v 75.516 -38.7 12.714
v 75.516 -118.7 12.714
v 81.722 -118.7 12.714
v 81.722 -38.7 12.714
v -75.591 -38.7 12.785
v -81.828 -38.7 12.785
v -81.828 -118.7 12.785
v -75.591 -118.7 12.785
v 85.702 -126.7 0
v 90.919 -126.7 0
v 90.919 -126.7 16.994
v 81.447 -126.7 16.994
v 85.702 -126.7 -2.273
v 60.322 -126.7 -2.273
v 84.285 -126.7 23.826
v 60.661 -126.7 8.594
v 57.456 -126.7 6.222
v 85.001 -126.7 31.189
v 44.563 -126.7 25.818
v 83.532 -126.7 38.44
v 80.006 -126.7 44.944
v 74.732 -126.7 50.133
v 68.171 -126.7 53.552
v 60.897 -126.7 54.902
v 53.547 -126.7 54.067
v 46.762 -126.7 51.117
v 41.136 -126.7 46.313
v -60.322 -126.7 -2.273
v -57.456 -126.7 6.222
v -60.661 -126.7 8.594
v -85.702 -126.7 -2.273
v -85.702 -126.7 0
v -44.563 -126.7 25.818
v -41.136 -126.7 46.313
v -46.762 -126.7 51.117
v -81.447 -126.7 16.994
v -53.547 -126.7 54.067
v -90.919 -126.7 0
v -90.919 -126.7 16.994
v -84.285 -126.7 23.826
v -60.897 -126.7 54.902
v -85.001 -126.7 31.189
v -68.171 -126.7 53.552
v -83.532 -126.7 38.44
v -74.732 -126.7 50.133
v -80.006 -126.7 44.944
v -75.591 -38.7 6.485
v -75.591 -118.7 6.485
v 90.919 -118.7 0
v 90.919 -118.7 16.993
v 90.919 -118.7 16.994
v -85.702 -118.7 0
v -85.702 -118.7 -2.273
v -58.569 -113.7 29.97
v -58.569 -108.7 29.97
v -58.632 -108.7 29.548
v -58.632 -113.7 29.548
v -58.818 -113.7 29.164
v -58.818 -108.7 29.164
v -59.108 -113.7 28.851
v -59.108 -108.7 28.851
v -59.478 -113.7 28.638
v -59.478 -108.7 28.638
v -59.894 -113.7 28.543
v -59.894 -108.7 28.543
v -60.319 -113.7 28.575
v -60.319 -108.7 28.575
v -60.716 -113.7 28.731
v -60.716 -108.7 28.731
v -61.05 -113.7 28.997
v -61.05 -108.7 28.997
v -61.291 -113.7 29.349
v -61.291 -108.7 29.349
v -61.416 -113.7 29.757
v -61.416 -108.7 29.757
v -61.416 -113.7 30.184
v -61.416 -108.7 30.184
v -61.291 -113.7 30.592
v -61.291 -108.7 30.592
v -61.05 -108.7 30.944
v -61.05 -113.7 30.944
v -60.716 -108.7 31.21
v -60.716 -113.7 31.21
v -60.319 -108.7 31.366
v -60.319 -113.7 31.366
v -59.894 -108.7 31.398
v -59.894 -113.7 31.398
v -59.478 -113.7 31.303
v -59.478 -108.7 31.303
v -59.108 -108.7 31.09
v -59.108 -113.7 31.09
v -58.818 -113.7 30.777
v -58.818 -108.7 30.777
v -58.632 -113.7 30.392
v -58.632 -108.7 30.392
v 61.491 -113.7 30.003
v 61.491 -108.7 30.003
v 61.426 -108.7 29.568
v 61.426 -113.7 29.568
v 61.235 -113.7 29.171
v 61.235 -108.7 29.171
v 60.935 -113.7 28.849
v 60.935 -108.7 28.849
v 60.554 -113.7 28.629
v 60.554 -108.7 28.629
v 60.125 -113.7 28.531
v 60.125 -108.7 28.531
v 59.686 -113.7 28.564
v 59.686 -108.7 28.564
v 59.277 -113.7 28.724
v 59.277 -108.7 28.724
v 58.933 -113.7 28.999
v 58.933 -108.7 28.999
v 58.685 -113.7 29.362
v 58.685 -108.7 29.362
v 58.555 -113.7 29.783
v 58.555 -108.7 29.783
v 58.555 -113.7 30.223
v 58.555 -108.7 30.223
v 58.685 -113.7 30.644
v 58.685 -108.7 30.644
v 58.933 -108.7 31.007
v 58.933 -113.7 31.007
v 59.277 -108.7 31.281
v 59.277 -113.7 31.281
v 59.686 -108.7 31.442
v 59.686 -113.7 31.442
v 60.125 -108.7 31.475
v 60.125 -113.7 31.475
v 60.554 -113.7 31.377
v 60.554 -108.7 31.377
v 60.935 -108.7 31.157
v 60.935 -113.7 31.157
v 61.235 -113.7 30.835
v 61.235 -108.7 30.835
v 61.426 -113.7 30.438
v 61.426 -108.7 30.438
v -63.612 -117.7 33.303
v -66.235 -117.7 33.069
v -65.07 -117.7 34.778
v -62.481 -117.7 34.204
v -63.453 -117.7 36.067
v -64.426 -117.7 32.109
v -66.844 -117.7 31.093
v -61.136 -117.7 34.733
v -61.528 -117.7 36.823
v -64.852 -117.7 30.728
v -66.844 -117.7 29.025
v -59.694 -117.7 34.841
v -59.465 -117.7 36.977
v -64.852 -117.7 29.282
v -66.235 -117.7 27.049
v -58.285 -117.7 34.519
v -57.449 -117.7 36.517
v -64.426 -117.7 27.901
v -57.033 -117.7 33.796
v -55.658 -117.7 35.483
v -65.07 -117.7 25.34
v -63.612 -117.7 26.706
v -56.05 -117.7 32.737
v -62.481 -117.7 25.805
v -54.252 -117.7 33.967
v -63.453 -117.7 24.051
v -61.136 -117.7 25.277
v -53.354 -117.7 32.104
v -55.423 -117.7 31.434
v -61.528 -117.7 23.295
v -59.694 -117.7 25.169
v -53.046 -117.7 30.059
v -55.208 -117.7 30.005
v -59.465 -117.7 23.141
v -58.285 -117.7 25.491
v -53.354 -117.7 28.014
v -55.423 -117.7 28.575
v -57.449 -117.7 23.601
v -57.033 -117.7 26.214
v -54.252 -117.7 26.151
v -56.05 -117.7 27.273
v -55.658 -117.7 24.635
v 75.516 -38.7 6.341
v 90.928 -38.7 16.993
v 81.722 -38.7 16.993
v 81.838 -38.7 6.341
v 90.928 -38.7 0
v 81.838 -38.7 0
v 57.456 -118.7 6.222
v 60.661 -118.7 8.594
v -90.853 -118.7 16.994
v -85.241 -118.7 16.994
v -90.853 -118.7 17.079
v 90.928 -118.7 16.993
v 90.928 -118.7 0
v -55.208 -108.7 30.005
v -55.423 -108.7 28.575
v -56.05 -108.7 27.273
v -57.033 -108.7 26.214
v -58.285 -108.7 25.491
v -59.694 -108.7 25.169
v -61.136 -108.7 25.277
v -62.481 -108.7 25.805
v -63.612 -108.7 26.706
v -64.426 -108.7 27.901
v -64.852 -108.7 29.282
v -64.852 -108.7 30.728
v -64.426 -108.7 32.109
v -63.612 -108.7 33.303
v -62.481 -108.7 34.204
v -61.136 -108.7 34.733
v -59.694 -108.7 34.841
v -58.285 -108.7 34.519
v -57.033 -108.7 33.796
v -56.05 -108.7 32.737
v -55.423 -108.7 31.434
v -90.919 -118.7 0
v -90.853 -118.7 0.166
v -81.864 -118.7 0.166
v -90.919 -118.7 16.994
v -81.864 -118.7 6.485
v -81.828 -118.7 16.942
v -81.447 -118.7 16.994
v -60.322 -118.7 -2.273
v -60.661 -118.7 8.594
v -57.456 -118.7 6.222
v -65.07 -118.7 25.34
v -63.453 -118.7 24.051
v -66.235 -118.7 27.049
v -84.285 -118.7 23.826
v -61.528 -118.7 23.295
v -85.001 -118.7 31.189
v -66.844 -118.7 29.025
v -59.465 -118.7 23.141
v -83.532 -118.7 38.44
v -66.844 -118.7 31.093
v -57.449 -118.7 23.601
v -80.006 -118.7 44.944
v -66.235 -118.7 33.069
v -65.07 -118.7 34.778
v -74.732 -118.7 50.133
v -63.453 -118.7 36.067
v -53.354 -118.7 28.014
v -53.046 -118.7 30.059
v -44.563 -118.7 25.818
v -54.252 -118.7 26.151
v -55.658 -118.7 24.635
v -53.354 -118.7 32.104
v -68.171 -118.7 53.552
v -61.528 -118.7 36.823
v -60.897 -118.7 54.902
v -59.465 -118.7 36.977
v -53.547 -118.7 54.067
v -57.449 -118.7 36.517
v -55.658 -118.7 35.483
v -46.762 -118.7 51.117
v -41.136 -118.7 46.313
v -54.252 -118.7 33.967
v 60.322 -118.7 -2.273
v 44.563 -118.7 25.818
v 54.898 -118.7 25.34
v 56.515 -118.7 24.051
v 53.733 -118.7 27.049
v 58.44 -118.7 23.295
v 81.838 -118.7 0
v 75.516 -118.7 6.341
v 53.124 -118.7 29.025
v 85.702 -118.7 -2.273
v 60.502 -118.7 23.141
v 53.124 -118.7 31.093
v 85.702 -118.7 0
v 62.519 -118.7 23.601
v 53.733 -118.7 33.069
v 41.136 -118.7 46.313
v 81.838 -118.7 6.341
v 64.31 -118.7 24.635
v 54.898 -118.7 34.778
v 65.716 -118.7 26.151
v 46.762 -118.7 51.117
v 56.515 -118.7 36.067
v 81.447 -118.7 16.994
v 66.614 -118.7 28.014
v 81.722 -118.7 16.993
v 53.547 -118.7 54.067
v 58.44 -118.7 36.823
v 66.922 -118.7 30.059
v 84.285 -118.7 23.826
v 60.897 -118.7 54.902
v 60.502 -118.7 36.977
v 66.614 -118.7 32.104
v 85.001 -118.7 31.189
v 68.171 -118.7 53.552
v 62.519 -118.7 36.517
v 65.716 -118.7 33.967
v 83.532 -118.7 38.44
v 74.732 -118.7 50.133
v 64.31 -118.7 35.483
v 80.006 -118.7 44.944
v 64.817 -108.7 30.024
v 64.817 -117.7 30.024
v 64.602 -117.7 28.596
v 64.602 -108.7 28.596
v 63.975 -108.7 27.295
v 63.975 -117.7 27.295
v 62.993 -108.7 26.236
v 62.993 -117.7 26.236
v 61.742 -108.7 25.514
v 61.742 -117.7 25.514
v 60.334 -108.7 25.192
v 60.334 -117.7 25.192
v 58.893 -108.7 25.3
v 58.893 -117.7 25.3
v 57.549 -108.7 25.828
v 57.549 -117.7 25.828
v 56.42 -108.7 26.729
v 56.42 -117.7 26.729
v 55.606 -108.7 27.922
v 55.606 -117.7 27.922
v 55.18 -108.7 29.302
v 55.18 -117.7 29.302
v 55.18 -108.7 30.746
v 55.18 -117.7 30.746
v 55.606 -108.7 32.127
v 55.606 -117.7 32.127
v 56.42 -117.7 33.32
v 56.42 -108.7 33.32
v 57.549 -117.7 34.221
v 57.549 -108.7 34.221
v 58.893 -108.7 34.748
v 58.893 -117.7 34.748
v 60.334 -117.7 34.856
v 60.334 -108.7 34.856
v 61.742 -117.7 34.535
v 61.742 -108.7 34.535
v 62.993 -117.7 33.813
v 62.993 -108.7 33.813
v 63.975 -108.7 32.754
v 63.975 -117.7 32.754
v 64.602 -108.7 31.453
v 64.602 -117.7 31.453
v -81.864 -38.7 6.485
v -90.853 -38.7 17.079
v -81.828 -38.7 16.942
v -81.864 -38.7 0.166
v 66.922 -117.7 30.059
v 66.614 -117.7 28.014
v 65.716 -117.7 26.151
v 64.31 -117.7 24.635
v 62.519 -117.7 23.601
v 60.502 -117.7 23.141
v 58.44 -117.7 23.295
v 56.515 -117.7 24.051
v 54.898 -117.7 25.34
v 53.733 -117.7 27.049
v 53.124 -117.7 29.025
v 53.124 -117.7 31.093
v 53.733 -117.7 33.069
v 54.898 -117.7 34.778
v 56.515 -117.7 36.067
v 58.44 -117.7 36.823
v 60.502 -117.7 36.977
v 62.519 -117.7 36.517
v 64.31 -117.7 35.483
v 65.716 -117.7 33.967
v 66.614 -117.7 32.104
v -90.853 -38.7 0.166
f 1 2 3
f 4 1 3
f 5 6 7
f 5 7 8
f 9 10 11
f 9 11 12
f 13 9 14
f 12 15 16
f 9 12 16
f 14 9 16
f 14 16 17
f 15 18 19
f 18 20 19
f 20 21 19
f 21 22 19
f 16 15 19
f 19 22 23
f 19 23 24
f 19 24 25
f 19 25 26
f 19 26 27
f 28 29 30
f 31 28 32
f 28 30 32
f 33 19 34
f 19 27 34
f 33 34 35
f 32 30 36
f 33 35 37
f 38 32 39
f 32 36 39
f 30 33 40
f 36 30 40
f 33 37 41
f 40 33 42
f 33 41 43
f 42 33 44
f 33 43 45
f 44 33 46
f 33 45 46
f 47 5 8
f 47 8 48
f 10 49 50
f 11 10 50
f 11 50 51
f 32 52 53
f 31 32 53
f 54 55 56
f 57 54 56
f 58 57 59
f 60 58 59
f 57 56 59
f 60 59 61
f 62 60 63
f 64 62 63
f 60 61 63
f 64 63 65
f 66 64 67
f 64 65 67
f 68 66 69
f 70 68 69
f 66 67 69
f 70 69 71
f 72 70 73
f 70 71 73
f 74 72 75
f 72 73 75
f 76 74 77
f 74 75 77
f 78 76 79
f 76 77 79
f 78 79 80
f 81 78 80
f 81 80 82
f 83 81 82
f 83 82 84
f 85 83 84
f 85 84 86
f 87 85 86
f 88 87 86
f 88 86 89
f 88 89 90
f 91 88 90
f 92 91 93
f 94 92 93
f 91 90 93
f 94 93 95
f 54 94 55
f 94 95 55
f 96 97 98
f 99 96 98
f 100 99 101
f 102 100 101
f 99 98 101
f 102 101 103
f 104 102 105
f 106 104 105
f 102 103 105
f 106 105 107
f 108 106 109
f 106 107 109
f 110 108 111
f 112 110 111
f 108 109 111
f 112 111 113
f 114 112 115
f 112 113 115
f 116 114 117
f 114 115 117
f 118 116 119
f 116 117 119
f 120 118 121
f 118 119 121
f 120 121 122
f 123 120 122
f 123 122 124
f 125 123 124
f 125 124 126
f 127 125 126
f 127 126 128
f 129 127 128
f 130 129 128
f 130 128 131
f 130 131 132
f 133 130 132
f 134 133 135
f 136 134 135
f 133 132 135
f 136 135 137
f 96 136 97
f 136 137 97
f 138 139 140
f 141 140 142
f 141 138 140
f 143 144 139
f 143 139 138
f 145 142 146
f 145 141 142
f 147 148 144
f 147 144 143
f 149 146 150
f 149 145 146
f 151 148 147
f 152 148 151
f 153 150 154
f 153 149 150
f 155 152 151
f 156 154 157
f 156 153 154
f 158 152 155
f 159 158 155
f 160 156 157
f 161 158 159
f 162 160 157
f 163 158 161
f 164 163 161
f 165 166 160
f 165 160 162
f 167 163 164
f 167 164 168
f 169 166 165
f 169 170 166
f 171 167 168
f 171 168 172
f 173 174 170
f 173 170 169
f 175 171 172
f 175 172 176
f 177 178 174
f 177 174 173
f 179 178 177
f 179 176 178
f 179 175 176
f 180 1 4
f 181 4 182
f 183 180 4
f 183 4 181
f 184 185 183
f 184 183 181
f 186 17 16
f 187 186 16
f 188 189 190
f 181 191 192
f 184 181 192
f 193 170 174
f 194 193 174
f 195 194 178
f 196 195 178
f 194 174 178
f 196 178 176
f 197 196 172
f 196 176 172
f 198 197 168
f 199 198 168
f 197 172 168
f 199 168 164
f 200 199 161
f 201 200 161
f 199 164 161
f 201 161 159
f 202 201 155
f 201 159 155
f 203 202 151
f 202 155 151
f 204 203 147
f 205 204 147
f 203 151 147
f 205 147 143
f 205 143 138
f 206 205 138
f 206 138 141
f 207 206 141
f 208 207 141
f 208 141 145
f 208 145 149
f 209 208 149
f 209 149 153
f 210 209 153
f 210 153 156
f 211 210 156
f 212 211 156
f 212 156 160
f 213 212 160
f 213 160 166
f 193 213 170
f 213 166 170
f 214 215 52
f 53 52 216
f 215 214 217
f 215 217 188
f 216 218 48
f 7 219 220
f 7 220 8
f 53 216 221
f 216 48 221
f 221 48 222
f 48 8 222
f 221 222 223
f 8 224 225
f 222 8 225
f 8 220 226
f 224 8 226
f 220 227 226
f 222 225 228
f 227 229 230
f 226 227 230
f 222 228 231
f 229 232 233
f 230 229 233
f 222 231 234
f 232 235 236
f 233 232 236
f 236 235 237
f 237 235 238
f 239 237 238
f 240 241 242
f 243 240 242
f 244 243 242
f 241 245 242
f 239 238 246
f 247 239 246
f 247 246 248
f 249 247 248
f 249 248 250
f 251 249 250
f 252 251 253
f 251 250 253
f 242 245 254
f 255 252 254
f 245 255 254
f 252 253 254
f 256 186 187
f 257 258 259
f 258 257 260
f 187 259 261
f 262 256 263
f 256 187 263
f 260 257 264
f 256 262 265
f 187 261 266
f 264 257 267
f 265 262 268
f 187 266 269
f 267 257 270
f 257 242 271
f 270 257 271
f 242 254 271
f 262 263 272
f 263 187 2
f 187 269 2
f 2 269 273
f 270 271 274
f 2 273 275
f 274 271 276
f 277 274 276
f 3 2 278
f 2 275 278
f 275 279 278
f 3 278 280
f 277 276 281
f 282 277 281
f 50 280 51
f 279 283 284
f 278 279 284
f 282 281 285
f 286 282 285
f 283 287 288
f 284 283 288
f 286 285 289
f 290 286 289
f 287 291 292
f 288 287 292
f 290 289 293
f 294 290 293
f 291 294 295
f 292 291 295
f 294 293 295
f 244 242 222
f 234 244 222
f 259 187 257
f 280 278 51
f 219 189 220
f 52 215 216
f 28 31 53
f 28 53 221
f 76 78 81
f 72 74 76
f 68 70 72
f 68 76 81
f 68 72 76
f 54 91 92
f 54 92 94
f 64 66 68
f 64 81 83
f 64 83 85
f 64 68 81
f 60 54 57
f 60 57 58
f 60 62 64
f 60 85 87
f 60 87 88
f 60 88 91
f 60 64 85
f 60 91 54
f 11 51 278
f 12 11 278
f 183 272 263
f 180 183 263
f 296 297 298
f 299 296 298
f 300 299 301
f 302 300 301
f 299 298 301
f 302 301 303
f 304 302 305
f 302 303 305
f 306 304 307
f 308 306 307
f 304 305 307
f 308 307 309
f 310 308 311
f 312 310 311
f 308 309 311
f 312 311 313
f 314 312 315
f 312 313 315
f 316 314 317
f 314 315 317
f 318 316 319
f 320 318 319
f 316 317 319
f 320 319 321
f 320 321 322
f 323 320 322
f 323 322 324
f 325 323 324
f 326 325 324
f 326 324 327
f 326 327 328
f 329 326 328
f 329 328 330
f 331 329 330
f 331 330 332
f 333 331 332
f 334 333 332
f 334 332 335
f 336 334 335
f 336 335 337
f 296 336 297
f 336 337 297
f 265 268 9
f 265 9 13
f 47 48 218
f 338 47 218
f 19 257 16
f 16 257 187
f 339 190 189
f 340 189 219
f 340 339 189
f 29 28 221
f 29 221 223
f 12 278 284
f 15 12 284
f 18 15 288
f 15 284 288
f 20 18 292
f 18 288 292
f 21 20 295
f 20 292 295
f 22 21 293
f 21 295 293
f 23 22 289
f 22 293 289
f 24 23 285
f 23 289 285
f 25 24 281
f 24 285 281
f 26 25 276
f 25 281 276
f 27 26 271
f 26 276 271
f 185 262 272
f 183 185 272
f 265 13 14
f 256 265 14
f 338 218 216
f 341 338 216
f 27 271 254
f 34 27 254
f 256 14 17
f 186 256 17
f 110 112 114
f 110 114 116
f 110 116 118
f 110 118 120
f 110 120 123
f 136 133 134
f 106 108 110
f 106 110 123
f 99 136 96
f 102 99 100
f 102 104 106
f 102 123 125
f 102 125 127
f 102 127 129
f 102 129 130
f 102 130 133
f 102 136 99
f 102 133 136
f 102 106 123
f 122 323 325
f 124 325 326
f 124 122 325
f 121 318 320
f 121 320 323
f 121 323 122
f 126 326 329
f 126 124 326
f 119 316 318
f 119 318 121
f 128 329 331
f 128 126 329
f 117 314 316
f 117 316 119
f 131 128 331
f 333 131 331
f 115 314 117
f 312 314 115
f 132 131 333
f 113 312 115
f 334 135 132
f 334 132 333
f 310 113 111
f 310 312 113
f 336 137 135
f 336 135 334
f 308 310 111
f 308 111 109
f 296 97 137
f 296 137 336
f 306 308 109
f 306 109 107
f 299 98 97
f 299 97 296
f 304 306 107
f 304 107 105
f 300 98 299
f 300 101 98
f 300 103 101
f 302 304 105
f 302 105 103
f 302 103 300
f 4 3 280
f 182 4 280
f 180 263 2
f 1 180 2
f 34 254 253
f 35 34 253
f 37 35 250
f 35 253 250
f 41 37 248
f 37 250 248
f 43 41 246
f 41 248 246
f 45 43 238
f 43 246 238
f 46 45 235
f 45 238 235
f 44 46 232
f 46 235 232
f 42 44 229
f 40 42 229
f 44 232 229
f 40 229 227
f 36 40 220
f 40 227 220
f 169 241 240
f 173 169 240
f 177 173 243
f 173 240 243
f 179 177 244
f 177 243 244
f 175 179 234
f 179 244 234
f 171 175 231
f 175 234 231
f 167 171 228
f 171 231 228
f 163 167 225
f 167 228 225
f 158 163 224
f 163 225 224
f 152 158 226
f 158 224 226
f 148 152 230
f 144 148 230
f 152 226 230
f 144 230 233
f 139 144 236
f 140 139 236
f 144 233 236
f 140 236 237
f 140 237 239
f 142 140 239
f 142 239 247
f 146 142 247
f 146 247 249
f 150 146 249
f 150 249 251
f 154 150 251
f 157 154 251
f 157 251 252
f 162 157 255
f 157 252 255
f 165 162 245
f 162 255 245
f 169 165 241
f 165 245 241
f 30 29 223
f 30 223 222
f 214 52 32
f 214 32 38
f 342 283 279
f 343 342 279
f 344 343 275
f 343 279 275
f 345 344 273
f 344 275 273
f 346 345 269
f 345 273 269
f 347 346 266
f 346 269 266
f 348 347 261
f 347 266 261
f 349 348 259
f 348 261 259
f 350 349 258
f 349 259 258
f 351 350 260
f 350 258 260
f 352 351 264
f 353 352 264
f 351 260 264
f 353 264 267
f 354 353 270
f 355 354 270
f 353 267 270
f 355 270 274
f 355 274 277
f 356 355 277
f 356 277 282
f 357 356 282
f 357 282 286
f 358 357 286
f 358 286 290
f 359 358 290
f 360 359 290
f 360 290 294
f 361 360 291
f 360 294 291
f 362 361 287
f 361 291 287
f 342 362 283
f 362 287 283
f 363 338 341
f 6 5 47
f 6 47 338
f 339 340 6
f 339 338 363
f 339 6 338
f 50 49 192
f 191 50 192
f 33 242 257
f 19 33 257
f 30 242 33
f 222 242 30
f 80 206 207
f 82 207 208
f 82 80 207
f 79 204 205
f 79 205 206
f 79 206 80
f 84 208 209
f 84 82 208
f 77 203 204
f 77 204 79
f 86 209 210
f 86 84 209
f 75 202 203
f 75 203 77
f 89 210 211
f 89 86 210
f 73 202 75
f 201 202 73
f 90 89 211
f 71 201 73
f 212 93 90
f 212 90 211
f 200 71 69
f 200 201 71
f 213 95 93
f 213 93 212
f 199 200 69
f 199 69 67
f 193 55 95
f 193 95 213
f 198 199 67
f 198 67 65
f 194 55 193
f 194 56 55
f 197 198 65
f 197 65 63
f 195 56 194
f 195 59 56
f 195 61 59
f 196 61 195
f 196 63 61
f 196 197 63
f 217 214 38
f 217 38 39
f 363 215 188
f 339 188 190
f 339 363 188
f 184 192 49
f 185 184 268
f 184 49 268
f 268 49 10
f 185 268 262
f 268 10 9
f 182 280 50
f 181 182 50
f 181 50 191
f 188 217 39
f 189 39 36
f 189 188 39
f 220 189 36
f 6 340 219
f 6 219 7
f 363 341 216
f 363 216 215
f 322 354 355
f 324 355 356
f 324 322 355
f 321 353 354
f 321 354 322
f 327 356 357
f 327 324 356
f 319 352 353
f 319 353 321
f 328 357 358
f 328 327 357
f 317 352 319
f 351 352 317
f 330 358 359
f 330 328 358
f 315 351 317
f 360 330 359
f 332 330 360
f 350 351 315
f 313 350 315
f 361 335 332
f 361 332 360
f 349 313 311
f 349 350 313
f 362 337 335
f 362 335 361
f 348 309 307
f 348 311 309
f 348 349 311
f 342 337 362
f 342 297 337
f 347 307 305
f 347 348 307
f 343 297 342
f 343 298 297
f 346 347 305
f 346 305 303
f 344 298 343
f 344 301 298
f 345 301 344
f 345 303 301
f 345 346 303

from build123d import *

# Parameters (mm, degrees)
PAD005_DEPTH    = 80
PAD006_DEPTH    = 8
PAD007_DEPTH    = 80
SKETCH011_R     = 6.937769
PAD008_DEPTH    = 1
SKETCH012_R     = 4.849298
SKETCH012_R_2   = 4.845408
PAD009_DEPTH    = 9
SKETCH013_R     = 1.431776
SKETCH013_R_2   = 1.476283
POCKET002_DEPTH = 5
PAD013_DEPTH    = 8


with BuildPart() as part:
    # Sketch008 → Pad005 (new body)
    with BuildSketch(Plane.XZ):
        Polygon((-81.828072, 16.941692), (-81.828072, 12.784613), (-75.591271, 12.784613), (-75.591271, 6.484819), (-81.863884, 6.484819), (-81.863884, 0.165597), (-90.85344, 0.165597), (-90.85344, 17.078894), align=None)
    extrude(amount=PAD005_DEPTH)

    # Sketch009 (on Face10 of Pad005) → Pad006 (join)
    with BuildSketch(Plane.XZ.offset(80)):
        with BuildLine():
            Line((-90.918877, 0), (-90.918877, 16.993577))
            Line((-90.918877, 16.993577), (-81.447352, 16.993577))
            ThreePointArc((-41.135882, 46.312654), (-74.731967, 50.132561), (-81.447352, 16.993577))
            Line((-41.135882, 46.312654), (0, 46.312654))
            Line((41.135882, 46.312654), (0, 46.312654))
            ThreePointArc((81.447352, 16.993577), (74.731967, 50.132561), (41.135882, 46.312654))
            Line((90.918877, 16.993577), (81.447352, 16.993577))
            Line((90.918877, 0), (90.918877, 16.993577))
            Line((68.692482, 0), (90.918877, 0))
            Line((44.563099, 25.81838), (68.692482, 0))
            Line((0, 25.81838), (44.563099, 25.81838))
            Line((0, 25.81838), (-44.563099, 25.81838))
            Line((-44.563099, 25.81838), (-68.692482, 0))
            Line((-68.692482, 0), (-90.918877, 0))
        make_face()
    extrude(amount=PAD006_DEPTH)

    # Sketch010 (on Face5 of Pad006) → Pad007 (join)
    with BuildSketch(Plane(origin=(0, -80, 0), x_dir=(1, 0, 0), z_dir=(0, 1, 0))):
        Polygon((81.838326, 0), (81.838326, -6.340793), (75.515793, -6.340793), (75.515793, -12.713724), (81.722115, -12.713724), (81.722115, -16.992775), (90.928337, -16.992775), (90.928337, 0), align=None)
    extrude(amount=PAD007_DEPTH)

    # Sketch011 (on Face5 of Pad007) → Pad008 (join)
    with BuildSketch(Plane(origin=(0, -80, 0), x_dir=(1, 0, 0), z_dir=(0, 1, 0))):
        with Locations((-59.983959, -30.058937)):
            Circle(SKETCH011_R)
        with Locations((59.983959, -30.058937)):
            Circle(SKETCH011_R)
    extrude(amount=PAD008_DEPTH)

    # Sketch012 (on Face39 of Pad008) → Pad009 (join)
    with BuildSketch(Plane(origin=(0, -79, 0), x_dir=(1, 0, 0), z_dir=(0, 1, 0))):
        with Locations((-60.056812, -30.004847)):
            Circle(SKETCH012_R)
        with Locations((59.971668, -30.024326)):
            Circle(SKETCH012_R_2)
    extrude(amount=PAD009_DEPTH)

    # Sketch013 (on Face43 of Pad009) → Pocket002 (cut)
    with BuildSketch(Plane(origin=(0, -70, 0), x_dir=(1, 0, 0), z_dir=(0, 1, 0))):
        with Locations((-60.000607, -29.970469)):
            Circle(SKETCH013_R)
        with Locations((60.014935, -30.002989)):
            Circle(SKETCH013_R_2)
    extrude(amount=-POCKET002_DEPTH, mode=Mode.SUBTRACT)

    # Sketch019 (on Face34 of Pocket002) → Pad013 (join)
    with BuildSketch(Plane.XZ.offset(88)):
        Polygon((-85.702133, 5.402917), (-85.702133, -2.272559), (-60.321888, -2.272559), (-57.456371, 6.221634), (-65.336533, 12.054996), align=None)
        Polygon((85.702133, 5.402917), (85.702133, -2.272559), (60.321888, -2.272559), (57.456371, 6.221634), (65.336533, 12.054996), align=None)
    extrude(amount=-PAD013_DEPTH)


with BuildPart() as part_1:
    # Body001 placement: moved
    add(part.part.moved(Location((0, -38.7, 0))))


solid = part_1.part
